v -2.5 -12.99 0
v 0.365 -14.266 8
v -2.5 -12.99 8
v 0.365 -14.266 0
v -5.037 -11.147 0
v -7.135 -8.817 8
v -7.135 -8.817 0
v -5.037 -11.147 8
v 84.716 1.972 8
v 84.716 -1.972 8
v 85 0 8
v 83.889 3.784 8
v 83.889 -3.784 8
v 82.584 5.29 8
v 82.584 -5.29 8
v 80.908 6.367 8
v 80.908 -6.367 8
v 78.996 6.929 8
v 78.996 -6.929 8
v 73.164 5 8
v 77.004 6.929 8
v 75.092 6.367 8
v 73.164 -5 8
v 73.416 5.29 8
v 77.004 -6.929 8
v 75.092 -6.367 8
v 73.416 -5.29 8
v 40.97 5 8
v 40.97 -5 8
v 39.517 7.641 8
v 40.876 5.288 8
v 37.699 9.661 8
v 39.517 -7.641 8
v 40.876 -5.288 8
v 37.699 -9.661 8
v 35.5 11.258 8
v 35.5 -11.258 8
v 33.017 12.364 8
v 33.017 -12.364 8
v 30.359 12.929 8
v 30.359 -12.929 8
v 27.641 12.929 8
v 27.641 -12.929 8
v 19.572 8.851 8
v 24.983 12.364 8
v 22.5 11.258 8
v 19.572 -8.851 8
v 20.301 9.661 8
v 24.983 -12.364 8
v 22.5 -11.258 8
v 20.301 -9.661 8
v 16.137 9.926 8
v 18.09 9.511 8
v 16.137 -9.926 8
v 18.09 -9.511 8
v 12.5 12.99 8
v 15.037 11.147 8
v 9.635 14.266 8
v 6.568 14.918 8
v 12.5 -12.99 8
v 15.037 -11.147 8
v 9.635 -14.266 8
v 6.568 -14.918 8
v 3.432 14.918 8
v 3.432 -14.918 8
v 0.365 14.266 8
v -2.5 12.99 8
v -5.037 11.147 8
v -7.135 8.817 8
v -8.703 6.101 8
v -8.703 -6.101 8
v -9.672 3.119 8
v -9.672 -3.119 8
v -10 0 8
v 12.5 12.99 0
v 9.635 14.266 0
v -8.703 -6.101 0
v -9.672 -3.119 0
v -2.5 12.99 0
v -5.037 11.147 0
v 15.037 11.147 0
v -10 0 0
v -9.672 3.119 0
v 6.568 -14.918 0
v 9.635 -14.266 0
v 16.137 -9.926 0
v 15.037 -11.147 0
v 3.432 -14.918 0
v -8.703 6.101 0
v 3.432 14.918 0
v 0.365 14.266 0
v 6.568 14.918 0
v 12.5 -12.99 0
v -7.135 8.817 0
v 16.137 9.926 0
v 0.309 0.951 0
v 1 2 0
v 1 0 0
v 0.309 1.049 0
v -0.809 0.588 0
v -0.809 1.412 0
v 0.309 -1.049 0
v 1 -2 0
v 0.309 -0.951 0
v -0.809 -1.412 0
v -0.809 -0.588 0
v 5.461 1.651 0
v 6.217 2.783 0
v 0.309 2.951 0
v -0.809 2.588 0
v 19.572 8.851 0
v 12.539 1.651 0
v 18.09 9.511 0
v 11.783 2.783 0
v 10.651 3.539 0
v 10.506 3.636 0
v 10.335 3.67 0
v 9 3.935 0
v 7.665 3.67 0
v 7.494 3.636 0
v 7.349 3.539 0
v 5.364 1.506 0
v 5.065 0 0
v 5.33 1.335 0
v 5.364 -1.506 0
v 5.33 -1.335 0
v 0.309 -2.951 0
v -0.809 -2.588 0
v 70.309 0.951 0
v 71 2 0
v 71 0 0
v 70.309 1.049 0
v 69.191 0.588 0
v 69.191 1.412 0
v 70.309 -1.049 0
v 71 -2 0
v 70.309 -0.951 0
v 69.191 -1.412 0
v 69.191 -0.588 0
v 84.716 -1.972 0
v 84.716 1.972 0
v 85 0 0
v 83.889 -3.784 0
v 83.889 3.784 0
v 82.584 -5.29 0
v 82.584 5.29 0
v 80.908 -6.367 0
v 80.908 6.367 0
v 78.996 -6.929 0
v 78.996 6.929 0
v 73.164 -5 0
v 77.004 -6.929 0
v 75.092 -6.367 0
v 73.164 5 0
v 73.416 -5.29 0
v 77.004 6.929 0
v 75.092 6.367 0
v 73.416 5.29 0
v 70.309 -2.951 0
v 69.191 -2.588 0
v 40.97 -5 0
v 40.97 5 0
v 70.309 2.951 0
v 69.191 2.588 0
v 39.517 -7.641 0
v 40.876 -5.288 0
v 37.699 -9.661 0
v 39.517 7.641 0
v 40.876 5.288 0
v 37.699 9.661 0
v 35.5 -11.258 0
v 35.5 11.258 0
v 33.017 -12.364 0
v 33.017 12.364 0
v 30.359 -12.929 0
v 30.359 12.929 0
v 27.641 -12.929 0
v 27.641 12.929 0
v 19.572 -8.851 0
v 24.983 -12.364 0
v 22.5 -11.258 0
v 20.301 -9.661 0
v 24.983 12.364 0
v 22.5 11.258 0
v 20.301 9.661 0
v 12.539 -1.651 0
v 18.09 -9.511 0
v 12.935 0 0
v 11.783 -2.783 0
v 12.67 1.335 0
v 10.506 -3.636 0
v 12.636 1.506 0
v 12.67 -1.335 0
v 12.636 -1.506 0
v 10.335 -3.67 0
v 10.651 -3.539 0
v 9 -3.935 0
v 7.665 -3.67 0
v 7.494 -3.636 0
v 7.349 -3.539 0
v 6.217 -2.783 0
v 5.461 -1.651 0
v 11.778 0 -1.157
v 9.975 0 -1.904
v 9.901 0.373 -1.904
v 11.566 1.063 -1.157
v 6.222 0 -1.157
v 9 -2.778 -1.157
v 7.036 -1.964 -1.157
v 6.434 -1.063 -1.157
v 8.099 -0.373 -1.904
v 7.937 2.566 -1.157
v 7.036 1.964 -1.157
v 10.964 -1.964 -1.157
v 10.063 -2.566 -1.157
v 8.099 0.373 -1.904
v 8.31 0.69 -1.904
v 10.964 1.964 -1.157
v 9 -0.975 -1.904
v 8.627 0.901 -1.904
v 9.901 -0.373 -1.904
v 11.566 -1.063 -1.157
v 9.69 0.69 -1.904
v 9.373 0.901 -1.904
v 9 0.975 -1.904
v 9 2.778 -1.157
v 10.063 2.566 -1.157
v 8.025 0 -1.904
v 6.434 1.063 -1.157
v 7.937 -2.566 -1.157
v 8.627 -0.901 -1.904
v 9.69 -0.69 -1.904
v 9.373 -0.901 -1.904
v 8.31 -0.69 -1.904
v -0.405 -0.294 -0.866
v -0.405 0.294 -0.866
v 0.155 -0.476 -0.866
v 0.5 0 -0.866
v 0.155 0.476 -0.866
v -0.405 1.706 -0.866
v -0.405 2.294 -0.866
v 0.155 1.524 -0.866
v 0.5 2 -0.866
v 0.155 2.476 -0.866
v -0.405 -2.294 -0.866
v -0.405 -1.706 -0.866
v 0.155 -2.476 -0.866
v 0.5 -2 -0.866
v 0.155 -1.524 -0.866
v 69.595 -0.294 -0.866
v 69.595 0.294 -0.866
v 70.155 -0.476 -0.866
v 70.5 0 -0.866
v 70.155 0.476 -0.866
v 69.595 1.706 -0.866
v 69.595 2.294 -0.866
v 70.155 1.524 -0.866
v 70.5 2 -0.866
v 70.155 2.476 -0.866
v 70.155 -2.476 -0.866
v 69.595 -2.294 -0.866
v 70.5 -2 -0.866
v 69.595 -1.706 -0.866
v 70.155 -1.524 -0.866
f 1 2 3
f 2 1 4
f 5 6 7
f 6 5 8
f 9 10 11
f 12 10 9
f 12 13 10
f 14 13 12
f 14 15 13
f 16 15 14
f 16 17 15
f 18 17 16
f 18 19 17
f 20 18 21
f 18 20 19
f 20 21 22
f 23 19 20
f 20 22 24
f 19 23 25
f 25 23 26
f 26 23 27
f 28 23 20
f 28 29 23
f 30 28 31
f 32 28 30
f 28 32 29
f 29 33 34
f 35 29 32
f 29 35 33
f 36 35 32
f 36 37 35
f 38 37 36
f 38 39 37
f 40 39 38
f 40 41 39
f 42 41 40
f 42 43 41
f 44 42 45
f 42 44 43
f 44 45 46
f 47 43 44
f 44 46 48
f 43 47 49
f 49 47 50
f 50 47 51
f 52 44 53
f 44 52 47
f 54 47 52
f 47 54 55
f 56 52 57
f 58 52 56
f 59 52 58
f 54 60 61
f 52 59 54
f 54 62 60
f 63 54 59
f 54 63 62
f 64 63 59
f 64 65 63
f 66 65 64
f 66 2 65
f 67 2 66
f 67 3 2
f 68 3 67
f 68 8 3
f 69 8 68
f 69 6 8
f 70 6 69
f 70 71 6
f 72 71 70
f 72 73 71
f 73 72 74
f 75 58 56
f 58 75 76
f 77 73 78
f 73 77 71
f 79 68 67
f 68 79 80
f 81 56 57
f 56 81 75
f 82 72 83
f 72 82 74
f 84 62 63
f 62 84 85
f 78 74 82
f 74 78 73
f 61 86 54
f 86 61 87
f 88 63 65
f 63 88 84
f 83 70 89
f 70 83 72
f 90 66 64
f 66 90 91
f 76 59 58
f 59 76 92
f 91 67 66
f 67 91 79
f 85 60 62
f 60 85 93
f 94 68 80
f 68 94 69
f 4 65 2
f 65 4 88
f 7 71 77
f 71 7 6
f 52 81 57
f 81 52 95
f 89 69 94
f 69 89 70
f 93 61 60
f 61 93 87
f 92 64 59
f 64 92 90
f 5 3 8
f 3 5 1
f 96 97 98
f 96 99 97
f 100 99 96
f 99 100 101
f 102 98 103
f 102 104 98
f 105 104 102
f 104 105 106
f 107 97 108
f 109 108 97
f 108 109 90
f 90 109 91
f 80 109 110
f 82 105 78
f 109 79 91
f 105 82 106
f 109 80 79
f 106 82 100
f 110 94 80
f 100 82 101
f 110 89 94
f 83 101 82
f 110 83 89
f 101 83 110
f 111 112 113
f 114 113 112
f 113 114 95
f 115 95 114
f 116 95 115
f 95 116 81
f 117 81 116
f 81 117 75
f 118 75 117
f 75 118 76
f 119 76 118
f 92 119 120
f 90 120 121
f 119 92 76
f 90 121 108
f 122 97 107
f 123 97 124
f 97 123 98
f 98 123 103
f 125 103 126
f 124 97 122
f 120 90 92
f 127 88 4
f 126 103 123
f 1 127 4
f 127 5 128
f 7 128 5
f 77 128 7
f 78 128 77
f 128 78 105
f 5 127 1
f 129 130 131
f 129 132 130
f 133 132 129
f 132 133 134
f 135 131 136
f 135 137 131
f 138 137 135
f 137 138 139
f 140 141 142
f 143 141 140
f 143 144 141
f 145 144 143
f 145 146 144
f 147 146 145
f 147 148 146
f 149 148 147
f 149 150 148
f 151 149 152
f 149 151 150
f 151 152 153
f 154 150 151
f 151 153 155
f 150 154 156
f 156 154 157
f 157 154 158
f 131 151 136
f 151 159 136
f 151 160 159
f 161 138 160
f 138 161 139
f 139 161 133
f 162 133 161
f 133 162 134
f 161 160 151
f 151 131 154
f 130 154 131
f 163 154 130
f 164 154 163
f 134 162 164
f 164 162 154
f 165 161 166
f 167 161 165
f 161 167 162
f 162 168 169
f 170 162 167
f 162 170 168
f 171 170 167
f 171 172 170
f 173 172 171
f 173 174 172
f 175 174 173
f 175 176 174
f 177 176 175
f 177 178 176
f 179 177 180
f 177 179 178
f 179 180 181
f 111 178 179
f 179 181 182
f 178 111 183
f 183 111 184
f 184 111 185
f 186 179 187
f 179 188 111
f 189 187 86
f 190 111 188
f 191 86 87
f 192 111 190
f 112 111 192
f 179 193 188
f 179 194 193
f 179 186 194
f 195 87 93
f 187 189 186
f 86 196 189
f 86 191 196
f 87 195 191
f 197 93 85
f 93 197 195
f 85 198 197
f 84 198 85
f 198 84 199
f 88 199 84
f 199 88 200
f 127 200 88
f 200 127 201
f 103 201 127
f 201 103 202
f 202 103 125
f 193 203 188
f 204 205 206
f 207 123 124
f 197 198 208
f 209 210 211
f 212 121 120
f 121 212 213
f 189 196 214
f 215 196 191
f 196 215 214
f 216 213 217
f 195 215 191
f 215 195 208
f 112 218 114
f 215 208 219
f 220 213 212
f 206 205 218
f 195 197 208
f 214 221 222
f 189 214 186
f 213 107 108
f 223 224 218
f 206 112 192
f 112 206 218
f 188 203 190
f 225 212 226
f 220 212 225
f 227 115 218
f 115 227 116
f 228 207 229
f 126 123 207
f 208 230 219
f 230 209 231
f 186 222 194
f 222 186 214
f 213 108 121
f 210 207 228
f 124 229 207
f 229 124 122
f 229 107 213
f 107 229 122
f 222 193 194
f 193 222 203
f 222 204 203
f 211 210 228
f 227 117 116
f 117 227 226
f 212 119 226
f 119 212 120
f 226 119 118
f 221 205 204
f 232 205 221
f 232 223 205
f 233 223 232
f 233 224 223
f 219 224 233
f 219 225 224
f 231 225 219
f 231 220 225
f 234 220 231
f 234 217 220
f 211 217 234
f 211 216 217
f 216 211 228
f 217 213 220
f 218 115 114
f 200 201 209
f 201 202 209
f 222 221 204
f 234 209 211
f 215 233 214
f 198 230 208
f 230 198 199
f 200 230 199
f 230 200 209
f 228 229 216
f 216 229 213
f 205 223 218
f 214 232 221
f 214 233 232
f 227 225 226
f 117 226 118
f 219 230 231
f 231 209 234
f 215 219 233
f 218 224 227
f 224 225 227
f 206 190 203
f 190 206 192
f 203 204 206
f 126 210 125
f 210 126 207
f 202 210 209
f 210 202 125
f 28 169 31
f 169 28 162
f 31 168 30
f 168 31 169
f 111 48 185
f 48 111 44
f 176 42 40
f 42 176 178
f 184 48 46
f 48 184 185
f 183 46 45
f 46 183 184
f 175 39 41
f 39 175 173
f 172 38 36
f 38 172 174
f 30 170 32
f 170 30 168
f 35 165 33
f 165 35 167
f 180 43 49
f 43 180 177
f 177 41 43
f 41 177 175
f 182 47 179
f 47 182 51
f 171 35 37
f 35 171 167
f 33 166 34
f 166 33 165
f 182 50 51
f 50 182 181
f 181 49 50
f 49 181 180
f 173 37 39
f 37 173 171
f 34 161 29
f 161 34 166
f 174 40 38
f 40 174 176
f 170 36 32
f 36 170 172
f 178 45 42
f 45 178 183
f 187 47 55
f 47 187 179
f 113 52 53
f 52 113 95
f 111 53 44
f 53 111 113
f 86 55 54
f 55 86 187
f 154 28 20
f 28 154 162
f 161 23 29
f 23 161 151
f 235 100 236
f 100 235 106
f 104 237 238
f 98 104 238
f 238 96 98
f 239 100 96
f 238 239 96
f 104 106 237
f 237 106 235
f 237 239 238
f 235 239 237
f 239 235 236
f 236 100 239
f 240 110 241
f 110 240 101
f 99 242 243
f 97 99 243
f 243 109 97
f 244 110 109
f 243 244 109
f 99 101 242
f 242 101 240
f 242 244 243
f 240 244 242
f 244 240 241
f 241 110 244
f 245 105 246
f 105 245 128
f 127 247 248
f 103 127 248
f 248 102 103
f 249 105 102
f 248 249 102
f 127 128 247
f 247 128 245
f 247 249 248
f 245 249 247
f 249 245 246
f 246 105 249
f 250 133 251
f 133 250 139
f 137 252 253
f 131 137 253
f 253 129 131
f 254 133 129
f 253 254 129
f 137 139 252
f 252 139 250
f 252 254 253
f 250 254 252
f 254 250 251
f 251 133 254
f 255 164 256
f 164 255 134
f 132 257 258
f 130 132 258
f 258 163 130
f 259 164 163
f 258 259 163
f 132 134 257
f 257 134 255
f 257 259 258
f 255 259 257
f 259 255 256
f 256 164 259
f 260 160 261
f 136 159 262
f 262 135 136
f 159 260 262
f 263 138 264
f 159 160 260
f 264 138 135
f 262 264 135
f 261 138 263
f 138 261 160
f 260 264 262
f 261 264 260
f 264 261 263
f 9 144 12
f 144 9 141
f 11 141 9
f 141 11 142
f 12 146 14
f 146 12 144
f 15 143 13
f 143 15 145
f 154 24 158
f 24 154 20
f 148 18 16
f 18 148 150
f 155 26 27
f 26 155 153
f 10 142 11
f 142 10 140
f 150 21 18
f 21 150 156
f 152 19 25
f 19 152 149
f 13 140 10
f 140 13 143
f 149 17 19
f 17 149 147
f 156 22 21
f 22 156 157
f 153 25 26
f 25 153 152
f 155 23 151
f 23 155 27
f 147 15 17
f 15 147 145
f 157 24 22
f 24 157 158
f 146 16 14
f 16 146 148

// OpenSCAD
translate([5,0,0])cylinder(8,15,15);
translate([9,0,3])color ([9,9,9])sphere(5);

translate([29,0,0])cylinder(8,13,13);
translate([15,0,0])cylinder(8,10,10);
translate([27,-5,0])cube([50,10,8]);
sphere(1);
translate([0,2,0])sphere(1);
translate([0,-2,0])sphere(1);
translate([70,0,0])sphere(1);
translate([70,2,0])sphere(1);
translate([70,-2,0])sphere(1);
translate([78,0,0])cylinder(8,7,7);
